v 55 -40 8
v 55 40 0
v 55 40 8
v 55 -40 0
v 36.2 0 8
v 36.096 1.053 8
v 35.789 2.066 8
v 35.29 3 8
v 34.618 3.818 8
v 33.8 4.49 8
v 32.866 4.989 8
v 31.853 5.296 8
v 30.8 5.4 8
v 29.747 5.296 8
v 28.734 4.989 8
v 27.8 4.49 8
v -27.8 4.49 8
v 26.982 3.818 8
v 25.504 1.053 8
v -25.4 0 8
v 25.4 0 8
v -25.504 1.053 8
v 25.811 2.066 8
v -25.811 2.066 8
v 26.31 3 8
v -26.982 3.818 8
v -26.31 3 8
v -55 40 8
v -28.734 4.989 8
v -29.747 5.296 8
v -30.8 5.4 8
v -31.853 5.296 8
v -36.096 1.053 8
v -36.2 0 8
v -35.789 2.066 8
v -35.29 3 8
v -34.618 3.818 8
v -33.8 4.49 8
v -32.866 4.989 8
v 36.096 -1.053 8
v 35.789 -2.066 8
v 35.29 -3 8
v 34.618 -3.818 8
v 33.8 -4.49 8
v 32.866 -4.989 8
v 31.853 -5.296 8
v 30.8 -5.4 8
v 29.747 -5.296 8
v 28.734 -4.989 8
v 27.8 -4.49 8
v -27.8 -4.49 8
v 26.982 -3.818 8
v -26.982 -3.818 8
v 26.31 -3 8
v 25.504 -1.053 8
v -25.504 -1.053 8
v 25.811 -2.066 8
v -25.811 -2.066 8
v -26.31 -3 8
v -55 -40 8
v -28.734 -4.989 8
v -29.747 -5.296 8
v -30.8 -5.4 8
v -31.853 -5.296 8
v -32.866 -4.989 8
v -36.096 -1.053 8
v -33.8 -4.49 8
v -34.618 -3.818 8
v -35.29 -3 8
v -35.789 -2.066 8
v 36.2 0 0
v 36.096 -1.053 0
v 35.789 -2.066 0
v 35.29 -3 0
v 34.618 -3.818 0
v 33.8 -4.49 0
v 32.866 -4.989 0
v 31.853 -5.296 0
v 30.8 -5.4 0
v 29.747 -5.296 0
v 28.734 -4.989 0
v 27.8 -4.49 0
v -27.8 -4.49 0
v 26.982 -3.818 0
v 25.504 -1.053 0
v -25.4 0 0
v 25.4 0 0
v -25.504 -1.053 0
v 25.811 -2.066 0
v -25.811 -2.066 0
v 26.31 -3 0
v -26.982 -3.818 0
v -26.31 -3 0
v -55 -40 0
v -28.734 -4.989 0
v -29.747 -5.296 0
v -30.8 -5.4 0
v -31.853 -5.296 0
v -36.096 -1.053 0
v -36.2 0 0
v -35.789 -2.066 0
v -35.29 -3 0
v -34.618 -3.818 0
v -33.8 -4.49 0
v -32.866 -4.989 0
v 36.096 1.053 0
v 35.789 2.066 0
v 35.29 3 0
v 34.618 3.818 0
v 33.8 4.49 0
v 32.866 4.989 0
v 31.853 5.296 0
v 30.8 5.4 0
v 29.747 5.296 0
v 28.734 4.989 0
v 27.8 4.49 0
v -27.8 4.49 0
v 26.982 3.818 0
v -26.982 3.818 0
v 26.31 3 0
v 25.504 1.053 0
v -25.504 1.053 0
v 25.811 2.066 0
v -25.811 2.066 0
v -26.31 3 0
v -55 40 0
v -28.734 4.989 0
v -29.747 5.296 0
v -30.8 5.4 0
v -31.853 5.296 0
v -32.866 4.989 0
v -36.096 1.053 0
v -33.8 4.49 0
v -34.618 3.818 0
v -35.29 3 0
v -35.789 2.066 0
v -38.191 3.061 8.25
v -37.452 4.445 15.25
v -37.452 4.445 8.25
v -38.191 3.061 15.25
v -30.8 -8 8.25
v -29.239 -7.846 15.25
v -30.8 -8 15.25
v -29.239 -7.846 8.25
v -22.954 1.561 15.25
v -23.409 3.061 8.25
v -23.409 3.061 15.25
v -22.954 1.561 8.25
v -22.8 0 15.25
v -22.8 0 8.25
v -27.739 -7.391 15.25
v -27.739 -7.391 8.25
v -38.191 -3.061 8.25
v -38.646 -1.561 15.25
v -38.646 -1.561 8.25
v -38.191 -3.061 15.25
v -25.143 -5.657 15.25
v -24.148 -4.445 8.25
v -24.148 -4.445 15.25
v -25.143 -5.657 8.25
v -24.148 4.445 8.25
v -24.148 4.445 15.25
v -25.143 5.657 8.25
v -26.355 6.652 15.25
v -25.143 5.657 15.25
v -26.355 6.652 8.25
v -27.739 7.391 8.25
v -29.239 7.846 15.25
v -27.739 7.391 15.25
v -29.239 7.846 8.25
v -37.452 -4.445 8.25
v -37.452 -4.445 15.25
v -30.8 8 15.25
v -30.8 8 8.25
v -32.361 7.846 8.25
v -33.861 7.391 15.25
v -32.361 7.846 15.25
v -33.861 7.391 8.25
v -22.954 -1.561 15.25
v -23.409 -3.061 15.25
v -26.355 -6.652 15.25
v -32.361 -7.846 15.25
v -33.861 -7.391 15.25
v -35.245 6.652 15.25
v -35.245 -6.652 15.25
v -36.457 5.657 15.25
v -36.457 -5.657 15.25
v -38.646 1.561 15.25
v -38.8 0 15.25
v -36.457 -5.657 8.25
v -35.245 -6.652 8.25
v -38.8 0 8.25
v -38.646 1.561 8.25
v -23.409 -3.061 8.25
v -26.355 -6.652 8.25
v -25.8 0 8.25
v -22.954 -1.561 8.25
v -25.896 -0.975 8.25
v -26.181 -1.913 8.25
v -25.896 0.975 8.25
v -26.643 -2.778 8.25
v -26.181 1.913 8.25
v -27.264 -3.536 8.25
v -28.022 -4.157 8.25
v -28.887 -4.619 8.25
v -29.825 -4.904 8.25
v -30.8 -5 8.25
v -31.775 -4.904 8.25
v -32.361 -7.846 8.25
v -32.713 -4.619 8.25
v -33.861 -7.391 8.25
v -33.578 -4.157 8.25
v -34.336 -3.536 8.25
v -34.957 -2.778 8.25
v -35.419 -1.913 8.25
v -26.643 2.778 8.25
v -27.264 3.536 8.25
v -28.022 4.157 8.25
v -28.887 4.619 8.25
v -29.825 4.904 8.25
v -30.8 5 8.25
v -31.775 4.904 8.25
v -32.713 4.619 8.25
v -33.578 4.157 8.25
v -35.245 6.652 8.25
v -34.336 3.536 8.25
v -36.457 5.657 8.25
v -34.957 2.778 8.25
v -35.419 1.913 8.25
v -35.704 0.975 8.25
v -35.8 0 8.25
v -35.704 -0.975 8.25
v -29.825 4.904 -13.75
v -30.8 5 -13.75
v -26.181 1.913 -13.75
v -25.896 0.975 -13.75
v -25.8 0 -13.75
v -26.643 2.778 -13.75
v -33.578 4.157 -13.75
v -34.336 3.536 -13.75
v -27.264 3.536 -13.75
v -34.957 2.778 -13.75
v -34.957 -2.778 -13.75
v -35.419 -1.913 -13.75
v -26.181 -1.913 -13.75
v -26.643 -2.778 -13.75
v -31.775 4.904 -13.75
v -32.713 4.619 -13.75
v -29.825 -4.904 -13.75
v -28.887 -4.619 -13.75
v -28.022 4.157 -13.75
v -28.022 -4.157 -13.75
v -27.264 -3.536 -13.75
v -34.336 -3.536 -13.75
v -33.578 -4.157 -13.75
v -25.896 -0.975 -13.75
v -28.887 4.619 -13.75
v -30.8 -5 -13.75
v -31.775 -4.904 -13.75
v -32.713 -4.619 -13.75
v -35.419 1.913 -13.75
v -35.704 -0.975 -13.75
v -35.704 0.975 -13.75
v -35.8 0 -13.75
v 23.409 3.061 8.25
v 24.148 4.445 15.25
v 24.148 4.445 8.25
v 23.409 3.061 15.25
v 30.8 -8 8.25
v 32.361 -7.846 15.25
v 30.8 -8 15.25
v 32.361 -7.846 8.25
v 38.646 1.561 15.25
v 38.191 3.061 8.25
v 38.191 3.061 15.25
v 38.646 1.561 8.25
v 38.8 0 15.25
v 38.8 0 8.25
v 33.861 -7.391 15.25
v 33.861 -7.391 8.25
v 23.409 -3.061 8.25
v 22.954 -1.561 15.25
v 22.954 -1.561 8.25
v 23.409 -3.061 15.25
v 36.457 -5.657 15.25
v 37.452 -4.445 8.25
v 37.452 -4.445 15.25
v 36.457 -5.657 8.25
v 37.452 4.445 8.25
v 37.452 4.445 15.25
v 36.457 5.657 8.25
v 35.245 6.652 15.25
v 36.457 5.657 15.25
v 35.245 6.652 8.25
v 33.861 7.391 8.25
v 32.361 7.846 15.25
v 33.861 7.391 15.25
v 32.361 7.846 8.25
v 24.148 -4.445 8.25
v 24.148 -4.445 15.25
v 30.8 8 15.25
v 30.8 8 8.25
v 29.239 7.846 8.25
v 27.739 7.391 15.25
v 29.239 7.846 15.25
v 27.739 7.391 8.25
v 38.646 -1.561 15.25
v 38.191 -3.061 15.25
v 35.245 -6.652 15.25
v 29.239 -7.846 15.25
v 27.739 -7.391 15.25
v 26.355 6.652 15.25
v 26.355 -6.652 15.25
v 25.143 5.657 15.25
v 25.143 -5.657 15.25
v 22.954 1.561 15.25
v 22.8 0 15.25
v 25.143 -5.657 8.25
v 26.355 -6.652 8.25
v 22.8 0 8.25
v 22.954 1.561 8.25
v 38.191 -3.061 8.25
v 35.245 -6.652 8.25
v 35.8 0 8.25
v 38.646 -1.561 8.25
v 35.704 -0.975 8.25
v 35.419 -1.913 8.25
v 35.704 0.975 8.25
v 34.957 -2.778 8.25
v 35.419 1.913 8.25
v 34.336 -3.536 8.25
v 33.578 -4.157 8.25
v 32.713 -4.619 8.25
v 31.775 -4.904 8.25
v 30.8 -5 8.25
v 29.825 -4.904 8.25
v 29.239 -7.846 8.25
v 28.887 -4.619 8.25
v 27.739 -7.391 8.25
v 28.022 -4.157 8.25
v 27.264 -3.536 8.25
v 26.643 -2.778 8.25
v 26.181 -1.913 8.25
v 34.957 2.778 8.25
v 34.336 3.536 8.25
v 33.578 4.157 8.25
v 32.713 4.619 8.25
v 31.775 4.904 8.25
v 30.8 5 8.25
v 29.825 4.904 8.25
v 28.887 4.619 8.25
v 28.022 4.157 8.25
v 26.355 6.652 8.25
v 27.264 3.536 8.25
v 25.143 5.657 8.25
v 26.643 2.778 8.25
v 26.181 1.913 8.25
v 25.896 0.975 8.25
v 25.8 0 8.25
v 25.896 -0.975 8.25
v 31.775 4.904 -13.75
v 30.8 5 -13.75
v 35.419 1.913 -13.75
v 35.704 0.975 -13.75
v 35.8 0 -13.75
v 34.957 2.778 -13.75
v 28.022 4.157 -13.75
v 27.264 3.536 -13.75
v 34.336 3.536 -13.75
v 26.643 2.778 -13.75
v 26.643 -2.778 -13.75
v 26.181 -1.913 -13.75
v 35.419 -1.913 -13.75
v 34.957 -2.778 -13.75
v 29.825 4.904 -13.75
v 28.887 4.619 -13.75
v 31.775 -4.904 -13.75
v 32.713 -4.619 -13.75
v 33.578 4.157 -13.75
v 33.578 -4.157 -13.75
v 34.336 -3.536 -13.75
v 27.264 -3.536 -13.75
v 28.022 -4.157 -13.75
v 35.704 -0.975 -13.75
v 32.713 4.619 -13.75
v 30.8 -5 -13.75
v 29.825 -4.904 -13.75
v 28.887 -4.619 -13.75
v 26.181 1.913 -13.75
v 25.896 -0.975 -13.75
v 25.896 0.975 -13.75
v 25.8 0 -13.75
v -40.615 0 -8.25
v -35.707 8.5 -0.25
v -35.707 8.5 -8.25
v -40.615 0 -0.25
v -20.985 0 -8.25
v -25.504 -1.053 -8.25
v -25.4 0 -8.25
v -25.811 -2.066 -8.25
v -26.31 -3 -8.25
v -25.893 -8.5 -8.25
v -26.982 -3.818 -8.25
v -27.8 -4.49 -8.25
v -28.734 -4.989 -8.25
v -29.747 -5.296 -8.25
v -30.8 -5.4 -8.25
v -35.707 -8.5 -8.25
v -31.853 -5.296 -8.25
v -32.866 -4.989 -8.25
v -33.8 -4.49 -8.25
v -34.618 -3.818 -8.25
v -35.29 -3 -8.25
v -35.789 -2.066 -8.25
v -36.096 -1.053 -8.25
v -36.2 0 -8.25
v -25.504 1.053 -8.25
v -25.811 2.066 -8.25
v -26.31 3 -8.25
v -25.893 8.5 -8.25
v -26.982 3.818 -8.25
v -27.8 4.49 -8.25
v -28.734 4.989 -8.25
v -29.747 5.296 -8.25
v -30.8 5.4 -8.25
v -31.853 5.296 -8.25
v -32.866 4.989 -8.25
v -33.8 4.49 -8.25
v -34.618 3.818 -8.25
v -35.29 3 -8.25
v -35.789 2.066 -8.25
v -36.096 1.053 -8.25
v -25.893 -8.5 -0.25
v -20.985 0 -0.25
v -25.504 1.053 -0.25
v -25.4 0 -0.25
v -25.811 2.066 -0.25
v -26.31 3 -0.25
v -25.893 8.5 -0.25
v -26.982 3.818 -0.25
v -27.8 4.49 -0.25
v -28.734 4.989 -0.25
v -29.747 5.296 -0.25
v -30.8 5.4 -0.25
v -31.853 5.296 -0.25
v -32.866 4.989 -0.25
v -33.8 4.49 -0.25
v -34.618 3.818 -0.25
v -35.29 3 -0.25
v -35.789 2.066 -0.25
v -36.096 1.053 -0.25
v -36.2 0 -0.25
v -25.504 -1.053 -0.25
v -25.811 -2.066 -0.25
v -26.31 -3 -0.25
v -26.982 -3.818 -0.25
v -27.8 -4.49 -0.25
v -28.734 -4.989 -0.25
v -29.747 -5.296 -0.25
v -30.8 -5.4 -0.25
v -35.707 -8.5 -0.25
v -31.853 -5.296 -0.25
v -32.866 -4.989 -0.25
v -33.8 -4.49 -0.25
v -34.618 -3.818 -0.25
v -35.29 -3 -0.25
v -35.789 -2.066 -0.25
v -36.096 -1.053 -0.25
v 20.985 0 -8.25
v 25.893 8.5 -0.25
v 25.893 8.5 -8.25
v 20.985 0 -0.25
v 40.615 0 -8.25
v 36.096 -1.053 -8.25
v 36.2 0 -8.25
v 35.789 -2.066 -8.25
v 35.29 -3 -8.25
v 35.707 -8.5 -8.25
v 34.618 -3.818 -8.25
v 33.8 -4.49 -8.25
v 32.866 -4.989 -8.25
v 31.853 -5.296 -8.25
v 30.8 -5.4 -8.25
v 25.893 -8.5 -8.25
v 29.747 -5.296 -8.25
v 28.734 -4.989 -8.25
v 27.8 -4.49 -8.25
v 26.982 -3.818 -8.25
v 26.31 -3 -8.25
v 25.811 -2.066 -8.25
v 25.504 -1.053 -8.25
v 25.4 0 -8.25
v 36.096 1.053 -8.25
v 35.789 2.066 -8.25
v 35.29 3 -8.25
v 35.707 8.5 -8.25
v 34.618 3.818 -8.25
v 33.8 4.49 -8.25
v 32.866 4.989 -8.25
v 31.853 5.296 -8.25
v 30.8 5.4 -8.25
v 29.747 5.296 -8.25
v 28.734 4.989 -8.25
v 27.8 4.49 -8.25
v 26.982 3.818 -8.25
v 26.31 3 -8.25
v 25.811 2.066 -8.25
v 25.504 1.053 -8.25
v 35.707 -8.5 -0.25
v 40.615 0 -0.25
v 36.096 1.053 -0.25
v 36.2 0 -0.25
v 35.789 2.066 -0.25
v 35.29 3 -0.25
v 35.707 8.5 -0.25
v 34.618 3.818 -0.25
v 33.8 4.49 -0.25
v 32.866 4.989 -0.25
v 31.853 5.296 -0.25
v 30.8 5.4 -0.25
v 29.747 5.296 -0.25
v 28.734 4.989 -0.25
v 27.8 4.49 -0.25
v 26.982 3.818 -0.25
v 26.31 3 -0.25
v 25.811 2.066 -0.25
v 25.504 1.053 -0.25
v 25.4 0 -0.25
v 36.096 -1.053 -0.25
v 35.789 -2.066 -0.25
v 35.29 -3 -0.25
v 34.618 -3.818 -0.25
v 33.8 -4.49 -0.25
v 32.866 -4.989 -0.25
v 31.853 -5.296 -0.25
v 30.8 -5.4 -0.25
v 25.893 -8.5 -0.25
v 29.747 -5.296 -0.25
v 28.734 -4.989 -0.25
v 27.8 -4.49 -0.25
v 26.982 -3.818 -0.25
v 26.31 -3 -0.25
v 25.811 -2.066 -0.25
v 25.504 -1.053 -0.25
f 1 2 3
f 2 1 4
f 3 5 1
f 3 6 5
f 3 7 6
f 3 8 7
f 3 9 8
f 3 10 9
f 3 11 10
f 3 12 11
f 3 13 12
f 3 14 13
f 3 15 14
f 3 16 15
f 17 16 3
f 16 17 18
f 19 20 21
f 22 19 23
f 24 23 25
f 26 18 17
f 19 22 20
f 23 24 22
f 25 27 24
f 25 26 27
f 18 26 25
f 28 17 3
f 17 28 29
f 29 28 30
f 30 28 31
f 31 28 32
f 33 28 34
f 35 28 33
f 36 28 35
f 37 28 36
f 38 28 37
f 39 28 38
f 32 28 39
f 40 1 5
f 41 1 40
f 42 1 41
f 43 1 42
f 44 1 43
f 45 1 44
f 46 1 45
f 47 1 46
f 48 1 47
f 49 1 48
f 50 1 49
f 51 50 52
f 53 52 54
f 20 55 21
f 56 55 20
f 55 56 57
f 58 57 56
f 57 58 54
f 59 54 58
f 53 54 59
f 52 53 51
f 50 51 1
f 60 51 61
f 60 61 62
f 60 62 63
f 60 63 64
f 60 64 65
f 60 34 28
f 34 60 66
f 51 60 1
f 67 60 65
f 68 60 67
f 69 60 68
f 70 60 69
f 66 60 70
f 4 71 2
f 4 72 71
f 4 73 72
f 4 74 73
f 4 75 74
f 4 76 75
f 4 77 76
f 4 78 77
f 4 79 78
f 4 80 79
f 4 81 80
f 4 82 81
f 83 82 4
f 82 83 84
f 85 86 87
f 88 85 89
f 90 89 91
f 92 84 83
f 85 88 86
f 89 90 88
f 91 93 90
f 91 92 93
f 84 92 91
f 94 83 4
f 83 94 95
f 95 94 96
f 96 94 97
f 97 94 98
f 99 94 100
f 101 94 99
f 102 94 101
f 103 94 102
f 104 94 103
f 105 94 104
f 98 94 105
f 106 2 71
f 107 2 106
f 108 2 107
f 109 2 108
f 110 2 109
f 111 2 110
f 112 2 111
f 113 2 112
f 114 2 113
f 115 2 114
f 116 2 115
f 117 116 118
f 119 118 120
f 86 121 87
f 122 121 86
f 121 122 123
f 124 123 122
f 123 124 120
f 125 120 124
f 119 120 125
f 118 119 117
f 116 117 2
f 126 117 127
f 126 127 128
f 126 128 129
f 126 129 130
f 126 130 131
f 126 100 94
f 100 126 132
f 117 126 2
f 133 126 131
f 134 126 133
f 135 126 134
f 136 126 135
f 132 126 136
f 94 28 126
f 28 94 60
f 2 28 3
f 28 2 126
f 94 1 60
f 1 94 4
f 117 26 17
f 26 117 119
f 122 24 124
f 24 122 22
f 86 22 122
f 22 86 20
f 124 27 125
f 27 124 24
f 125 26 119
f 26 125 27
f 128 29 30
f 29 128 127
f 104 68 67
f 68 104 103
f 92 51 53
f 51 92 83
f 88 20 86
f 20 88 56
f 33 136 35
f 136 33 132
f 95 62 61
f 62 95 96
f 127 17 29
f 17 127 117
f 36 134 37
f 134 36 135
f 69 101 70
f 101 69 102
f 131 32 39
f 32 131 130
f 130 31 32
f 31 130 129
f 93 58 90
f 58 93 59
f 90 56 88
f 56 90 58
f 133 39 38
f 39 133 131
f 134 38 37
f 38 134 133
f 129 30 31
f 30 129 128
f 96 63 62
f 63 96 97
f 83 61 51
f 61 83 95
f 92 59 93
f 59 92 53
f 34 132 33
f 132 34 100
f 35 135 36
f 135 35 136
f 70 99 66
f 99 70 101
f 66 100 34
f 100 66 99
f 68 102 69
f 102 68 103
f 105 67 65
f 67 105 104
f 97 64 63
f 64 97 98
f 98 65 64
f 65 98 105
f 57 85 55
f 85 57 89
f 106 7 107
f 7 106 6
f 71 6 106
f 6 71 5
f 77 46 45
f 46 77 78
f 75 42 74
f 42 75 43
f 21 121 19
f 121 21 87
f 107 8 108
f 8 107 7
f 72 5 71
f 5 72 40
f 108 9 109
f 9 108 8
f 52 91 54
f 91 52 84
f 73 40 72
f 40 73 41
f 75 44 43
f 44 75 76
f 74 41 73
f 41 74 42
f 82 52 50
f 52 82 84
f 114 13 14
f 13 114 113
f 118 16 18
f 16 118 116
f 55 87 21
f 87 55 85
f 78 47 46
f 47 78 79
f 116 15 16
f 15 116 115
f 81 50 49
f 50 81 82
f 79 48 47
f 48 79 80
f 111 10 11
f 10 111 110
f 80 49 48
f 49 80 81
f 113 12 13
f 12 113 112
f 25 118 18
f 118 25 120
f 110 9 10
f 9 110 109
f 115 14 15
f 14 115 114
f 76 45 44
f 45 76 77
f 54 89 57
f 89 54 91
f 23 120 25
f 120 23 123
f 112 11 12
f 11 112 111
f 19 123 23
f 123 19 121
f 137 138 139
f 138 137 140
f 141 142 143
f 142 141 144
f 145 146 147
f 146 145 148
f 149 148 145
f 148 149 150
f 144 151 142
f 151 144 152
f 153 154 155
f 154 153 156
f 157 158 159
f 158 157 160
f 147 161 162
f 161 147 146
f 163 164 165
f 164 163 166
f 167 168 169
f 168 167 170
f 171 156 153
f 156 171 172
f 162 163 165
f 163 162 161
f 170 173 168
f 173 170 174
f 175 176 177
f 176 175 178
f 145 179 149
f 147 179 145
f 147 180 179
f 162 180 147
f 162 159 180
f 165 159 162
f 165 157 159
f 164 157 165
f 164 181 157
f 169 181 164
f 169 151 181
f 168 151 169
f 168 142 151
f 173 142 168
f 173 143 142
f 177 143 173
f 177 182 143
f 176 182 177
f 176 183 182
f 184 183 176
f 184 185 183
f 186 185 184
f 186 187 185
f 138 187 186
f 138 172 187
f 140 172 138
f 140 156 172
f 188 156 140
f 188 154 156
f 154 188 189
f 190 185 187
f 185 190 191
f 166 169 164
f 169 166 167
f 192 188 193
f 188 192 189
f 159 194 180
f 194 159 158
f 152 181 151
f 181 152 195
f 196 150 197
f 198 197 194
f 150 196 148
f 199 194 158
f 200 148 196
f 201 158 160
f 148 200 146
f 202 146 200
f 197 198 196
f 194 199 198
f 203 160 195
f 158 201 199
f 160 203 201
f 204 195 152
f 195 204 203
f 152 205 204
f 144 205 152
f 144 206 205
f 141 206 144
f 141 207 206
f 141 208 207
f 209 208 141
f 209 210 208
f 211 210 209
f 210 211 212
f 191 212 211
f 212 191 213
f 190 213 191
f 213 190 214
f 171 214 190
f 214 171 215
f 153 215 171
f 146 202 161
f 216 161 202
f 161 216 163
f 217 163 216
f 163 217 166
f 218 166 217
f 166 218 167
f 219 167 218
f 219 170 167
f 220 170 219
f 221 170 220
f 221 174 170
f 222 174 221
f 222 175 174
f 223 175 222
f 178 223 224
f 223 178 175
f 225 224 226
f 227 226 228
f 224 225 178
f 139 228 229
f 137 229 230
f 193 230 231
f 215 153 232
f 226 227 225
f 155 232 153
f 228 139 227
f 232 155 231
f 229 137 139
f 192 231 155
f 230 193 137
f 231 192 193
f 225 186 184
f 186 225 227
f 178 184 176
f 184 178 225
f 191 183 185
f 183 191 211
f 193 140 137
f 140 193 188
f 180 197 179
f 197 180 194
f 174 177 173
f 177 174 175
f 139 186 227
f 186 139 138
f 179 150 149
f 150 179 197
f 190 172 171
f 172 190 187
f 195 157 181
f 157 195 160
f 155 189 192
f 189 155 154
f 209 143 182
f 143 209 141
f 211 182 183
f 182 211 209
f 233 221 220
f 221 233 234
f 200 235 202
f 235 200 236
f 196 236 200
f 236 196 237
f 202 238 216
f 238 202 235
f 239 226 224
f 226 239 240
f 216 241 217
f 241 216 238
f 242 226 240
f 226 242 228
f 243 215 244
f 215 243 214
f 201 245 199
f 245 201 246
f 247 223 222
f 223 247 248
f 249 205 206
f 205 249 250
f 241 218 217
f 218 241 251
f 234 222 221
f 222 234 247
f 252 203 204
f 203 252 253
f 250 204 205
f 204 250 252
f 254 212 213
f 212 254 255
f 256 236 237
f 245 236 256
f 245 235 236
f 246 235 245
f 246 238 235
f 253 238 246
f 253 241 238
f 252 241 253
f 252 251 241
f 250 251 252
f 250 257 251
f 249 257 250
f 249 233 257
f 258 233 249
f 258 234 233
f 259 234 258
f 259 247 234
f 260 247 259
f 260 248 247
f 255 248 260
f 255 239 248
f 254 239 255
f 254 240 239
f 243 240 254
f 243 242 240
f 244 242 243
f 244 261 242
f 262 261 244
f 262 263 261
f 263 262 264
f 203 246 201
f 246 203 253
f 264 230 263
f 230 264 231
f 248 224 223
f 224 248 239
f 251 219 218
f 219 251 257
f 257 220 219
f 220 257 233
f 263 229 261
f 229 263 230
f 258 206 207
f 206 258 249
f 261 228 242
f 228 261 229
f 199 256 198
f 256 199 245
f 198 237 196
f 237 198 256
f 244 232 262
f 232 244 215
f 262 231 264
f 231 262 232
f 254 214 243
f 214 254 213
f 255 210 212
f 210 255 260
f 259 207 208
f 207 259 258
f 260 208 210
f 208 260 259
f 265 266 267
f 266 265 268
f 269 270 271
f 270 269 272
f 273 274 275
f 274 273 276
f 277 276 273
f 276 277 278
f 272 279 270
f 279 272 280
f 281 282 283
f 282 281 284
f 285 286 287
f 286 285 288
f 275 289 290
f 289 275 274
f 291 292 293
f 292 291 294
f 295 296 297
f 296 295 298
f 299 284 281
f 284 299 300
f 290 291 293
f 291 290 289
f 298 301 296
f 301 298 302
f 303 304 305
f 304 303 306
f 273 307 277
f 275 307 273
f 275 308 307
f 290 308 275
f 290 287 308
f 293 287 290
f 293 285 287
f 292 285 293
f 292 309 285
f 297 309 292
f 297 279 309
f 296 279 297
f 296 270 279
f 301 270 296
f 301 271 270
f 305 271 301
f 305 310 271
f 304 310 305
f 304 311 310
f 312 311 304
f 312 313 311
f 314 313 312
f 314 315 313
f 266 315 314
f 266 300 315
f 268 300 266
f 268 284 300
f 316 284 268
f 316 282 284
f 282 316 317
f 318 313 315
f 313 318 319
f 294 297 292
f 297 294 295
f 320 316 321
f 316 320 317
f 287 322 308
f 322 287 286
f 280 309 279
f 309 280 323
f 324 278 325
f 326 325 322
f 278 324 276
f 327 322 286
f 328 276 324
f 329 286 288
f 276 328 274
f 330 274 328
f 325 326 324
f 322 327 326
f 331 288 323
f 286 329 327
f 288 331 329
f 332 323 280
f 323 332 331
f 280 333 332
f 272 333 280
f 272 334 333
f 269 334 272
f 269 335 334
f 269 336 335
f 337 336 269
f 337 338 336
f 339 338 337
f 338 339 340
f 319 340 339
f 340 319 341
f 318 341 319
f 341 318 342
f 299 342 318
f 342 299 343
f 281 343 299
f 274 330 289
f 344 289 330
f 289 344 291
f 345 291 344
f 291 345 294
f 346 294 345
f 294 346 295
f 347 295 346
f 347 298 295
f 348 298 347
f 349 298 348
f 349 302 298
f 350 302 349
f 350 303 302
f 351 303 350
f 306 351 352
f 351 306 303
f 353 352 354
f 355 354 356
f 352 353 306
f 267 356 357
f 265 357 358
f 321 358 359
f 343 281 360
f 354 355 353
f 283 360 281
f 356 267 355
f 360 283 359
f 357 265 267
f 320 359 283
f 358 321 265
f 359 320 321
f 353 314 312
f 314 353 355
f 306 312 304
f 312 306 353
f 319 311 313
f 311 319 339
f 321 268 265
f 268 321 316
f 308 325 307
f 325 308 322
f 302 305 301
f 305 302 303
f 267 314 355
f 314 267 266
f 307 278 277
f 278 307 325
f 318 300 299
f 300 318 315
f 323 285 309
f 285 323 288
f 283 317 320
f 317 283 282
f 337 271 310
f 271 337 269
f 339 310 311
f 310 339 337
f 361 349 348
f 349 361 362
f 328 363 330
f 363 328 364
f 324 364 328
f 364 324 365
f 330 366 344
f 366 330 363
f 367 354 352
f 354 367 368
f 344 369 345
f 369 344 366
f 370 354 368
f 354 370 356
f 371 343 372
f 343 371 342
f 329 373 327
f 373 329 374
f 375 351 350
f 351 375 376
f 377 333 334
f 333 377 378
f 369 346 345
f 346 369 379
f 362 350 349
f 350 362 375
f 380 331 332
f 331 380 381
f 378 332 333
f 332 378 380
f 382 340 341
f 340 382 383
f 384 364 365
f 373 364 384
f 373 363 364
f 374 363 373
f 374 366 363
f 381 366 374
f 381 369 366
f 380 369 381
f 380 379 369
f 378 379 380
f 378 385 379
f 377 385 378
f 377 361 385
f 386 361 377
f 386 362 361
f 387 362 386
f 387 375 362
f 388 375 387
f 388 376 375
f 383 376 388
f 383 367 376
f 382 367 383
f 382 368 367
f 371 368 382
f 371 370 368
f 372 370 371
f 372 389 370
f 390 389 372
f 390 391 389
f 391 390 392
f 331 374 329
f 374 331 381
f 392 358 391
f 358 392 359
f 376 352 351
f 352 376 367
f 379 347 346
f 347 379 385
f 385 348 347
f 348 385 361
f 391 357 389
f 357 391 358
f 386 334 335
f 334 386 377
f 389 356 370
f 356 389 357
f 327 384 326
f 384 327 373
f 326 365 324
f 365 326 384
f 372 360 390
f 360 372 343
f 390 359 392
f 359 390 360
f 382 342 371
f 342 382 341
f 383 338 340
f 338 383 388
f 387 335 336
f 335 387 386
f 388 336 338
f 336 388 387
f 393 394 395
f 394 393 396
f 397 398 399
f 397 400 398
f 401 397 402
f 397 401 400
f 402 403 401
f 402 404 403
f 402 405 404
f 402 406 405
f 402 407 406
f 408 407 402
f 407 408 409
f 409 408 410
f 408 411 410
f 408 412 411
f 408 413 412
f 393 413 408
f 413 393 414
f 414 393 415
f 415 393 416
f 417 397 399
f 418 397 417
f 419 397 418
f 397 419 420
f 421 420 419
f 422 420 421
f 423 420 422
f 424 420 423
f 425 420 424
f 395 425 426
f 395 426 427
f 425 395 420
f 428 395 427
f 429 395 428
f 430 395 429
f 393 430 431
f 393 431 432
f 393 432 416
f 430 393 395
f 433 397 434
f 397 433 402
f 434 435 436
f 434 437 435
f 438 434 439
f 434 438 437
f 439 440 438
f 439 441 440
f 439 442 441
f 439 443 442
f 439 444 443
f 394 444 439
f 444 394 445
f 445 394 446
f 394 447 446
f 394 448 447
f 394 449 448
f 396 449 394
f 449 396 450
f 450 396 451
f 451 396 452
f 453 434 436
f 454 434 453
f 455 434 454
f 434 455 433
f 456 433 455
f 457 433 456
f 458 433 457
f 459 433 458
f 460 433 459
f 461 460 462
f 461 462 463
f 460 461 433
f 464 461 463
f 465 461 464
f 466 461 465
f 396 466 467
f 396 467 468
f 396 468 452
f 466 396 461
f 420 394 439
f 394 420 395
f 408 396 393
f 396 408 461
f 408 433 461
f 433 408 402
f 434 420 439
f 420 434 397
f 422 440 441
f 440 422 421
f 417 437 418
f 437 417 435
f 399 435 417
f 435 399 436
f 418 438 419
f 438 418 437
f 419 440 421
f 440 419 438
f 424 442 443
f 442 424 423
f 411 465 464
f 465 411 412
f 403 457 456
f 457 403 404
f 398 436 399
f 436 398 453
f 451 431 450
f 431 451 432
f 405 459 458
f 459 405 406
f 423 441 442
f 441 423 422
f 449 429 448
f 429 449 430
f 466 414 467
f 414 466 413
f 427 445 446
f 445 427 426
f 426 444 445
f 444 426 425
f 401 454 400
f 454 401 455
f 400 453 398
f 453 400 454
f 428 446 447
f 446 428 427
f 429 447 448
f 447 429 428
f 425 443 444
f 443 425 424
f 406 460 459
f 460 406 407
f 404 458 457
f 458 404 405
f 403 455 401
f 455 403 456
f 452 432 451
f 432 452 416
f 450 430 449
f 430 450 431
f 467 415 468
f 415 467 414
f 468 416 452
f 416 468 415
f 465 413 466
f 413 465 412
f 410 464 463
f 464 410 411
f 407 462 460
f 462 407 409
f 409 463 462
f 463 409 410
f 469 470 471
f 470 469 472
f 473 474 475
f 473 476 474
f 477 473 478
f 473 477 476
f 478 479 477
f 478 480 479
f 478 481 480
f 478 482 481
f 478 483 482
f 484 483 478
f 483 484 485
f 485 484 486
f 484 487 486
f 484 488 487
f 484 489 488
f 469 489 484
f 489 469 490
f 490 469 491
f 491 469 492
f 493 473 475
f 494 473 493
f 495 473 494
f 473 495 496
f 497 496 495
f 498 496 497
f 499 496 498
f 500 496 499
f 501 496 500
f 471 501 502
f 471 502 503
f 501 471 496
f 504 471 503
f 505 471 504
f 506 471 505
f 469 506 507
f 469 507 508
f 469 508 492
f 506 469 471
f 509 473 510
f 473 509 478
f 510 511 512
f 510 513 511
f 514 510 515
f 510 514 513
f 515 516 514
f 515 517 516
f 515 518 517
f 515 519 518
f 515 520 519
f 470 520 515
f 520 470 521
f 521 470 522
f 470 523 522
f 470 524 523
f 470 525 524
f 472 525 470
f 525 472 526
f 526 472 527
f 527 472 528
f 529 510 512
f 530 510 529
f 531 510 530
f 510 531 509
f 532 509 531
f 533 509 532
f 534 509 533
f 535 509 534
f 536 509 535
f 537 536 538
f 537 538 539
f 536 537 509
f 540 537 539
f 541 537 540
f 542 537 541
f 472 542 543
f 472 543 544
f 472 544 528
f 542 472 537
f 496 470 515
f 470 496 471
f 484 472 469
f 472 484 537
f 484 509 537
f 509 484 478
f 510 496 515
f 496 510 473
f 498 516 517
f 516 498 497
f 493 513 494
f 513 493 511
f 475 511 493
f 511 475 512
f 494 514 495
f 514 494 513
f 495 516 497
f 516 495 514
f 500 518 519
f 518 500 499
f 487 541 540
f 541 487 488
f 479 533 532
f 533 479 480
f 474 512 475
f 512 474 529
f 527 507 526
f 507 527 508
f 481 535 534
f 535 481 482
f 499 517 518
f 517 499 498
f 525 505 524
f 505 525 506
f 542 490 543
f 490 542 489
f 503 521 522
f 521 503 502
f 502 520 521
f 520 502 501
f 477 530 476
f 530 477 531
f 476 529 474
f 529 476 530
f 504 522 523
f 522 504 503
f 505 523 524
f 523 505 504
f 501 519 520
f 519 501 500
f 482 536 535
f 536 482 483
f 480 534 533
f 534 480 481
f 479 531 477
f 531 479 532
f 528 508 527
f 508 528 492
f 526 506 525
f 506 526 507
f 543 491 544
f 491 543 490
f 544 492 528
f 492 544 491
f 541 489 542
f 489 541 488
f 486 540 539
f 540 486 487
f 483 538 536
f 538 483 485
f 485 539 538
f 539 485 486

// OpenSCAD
$fn = 32;

// ------------------------------------------------------------------------
// Bolted plate: 110 x 80 x 8 mm plate, 2 fasteners
// Every part is its own module, assembly() places them once.
// ------------------------------------------------------------------------

// --- part 1 ---
module plate() {
  difference() {
    translate([-55, -40, 0]) cube([110, 80, 8]);
    translate([-30.8, 0, -1]) cylinder(h = 10, d = 10.8);
    translate([30.8, 0, -1]) cylinder(h = 10, d = 10.8);
  }
}

// --- part 2 ---
module bolt1() {
  cylinder(h = 7, d = 16);
  translate([0, 0, -22]) cylinder(h = 22, d = 10);
}

// --- part 3 ---
module bolt2() {
  cylinder(h = 7, d = 16);
  translate([0, 0, -22]) cylinder(h = 22, d = 10);
}

// --- part 4 ---
module nut1() {
  difference() {
    linear_extrude(height = 8) polygon(points = [[9.815, 0], [4.907, 8.5], [-4.907, 8.5], [-9.815, 0], [-4.907, -8.5], [4.907, -8.5]]);
    translate([0, 0, -1]) cylinder(h = 10, d = 10.8);
  }
}

// --- part 5 ---
module nut2() {
  difference() {
    linear_extrude(height = 8) polygon(points = [[9.815, 0], [4.907, 8.5], [-4.907, 8.5], [-9.815, 0], [-4.907, -8.5], [4.907, -8.5]]);
    translate([0, 0, -1]) cylinder(h = 10, d = 10.8);
  }
}

// --- assembly ---
module assembly() {
  translate([0, 0, 0]) rotate([0, 0, 0]) plate();
  translate([-30.8, 0, 8.25]) rotate([0, 0, 0]) bolt1();
  translate([30.8, 0, 8.25]) rotate([0, 0, 0]) bolt2();
  translate([-30.8, 0, -8.25]) rotate([0, 0, 0]) nut1();
  translate([30.8, 0, -8.25]) rotate([0, 0, 0]) nut2();
}

assembly();
